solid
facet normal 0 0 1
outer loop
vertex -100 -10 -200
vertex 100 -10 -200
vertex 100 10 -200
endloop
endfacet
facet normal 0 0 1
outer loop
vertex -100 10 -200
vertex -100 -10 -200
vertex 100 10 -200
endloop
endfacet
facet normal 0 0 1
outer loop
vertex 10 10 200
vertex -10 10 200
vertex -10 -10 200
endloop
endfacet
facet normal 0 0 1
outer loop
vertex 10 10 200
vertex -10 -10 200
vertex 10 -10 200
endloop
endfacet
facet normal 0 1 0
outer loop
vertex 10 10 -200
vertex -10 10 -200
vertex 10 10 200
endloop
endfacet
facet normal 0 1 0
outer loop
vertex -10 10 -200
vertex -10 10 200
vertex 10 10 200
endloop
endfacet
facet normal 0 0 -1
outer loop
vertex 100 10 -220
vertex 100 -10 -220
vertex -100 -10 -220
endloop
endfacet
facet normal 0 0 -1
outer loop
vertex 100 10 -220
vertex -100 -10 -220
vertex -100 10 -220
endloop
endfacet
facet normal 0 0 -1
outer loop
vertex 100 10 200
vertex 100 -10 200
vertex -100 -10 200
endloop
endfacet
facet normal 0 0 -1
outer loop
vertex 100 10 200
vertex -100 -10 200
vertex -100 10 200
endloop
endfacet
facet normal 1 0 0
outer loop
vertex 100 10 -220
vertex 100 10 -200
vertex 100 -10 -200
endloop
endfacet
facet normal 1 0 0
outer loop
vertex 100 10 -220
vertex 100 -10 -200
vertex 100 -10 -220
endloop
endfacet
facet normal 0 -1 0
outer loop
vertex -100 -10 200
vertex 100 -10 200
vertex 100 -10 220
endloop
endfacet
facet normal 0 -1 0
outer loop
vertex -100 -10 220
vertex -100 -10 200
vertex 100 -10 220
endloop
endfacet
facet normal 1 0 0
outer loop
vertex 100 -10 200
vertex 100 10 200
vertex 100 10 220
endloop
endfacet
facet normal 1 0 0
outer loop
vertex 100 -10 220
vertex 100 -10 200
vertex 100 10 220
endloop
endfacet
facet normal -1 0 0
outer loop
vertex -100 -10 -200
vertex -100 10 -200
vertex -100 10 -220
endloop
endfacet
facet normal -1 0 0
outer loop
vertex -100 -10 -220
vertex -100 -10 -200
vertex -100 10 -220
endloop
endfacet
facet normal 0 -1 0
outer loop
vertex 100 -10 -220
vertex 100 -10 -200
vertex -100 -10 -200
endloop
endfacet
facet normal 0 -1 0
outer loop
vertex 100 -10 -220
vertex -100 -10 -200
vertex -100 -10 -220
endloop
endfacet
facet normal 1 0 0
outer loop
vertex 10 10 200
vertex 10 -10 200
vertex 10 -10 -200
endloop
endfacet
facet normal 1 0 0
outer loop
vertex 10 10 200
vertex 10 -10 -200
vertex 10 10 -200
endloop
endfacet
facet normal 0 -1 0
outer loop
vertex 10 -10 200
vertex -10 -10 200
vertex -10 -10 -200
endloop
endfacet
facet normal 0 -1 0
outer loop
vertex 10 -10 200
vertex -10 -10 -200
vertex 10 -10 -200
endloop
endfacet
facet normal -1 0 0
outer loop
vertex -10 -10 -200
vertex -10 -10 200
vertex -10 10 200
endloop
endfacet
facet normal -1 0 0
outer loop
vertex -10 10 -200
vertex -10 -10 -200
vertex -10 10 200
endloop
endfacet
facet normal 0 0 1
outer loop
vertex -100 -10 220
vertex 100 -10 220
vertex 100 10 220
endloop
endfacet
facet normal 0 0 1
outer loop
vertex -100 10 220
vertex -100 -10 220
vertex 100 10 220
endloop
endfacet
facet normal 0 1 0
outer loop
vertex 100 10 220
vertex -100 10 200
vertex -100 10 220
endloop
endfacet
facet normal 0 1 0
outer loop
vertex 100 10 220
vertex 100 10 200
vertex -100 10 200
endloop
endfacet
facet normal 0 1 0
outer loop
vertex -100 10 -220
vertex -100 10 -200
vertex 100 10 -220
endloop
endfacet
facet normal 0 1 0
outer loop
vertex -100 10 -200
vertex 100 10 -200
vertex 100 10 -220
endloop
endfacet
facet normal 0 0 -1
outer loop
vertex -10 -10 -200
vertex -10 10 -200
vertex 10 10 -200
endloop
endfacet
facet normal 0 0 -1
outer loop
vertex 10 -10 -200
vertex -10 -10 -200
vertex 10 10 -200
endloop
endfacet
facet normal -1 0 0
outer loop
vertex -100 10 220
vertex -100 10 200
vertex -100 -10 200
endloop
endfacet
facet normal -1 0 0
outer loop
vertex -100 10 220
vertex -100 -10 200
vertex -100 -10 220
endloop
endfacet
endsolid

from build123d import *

# Parameters (mm, degrees)
SKETCH_1_W      = 20
SKETCH_1_H      = 20
EXTRUDE_1_DEPTH = 200
SKETCH_2_W      = 20
SKETCH_2_H      = 20
EXTRUDE_2_DEPTH = 100


with BuildPart() as part:
    # Эскиз1 → Бобышка-Вытянуть1 (new, symmetric)
    with BuildSketch(Plane.XY):
        Rectangle(SKETCH_1_W, SKETCH_1_H)
    extrude(amount=EXTRUDE_1_DEPTH, both=True)


with BuildPart() as body_2:
    # Эскиз2 → Бобышка-Вытянуть2 (new, symmetric)
    with BuildSketch(Plane(origin=(0, 0, 0), x_dir=(0, 0, -1), z_dir=(1, 0, 0))):
        with Locations((210, 0)):
            Rectangle(SKETCH_2_W, SKETCH_2_H)
    extrude(amount=EXTRUDE_2_DEPTH, both=True)


with BuildPart() as body_3:
    # Зеркальное отражение1: mirrored copy
    add(body_2.part.mirror(Plane.XY))


solid = Compound([part.part, body_2.part, body_3.part])
